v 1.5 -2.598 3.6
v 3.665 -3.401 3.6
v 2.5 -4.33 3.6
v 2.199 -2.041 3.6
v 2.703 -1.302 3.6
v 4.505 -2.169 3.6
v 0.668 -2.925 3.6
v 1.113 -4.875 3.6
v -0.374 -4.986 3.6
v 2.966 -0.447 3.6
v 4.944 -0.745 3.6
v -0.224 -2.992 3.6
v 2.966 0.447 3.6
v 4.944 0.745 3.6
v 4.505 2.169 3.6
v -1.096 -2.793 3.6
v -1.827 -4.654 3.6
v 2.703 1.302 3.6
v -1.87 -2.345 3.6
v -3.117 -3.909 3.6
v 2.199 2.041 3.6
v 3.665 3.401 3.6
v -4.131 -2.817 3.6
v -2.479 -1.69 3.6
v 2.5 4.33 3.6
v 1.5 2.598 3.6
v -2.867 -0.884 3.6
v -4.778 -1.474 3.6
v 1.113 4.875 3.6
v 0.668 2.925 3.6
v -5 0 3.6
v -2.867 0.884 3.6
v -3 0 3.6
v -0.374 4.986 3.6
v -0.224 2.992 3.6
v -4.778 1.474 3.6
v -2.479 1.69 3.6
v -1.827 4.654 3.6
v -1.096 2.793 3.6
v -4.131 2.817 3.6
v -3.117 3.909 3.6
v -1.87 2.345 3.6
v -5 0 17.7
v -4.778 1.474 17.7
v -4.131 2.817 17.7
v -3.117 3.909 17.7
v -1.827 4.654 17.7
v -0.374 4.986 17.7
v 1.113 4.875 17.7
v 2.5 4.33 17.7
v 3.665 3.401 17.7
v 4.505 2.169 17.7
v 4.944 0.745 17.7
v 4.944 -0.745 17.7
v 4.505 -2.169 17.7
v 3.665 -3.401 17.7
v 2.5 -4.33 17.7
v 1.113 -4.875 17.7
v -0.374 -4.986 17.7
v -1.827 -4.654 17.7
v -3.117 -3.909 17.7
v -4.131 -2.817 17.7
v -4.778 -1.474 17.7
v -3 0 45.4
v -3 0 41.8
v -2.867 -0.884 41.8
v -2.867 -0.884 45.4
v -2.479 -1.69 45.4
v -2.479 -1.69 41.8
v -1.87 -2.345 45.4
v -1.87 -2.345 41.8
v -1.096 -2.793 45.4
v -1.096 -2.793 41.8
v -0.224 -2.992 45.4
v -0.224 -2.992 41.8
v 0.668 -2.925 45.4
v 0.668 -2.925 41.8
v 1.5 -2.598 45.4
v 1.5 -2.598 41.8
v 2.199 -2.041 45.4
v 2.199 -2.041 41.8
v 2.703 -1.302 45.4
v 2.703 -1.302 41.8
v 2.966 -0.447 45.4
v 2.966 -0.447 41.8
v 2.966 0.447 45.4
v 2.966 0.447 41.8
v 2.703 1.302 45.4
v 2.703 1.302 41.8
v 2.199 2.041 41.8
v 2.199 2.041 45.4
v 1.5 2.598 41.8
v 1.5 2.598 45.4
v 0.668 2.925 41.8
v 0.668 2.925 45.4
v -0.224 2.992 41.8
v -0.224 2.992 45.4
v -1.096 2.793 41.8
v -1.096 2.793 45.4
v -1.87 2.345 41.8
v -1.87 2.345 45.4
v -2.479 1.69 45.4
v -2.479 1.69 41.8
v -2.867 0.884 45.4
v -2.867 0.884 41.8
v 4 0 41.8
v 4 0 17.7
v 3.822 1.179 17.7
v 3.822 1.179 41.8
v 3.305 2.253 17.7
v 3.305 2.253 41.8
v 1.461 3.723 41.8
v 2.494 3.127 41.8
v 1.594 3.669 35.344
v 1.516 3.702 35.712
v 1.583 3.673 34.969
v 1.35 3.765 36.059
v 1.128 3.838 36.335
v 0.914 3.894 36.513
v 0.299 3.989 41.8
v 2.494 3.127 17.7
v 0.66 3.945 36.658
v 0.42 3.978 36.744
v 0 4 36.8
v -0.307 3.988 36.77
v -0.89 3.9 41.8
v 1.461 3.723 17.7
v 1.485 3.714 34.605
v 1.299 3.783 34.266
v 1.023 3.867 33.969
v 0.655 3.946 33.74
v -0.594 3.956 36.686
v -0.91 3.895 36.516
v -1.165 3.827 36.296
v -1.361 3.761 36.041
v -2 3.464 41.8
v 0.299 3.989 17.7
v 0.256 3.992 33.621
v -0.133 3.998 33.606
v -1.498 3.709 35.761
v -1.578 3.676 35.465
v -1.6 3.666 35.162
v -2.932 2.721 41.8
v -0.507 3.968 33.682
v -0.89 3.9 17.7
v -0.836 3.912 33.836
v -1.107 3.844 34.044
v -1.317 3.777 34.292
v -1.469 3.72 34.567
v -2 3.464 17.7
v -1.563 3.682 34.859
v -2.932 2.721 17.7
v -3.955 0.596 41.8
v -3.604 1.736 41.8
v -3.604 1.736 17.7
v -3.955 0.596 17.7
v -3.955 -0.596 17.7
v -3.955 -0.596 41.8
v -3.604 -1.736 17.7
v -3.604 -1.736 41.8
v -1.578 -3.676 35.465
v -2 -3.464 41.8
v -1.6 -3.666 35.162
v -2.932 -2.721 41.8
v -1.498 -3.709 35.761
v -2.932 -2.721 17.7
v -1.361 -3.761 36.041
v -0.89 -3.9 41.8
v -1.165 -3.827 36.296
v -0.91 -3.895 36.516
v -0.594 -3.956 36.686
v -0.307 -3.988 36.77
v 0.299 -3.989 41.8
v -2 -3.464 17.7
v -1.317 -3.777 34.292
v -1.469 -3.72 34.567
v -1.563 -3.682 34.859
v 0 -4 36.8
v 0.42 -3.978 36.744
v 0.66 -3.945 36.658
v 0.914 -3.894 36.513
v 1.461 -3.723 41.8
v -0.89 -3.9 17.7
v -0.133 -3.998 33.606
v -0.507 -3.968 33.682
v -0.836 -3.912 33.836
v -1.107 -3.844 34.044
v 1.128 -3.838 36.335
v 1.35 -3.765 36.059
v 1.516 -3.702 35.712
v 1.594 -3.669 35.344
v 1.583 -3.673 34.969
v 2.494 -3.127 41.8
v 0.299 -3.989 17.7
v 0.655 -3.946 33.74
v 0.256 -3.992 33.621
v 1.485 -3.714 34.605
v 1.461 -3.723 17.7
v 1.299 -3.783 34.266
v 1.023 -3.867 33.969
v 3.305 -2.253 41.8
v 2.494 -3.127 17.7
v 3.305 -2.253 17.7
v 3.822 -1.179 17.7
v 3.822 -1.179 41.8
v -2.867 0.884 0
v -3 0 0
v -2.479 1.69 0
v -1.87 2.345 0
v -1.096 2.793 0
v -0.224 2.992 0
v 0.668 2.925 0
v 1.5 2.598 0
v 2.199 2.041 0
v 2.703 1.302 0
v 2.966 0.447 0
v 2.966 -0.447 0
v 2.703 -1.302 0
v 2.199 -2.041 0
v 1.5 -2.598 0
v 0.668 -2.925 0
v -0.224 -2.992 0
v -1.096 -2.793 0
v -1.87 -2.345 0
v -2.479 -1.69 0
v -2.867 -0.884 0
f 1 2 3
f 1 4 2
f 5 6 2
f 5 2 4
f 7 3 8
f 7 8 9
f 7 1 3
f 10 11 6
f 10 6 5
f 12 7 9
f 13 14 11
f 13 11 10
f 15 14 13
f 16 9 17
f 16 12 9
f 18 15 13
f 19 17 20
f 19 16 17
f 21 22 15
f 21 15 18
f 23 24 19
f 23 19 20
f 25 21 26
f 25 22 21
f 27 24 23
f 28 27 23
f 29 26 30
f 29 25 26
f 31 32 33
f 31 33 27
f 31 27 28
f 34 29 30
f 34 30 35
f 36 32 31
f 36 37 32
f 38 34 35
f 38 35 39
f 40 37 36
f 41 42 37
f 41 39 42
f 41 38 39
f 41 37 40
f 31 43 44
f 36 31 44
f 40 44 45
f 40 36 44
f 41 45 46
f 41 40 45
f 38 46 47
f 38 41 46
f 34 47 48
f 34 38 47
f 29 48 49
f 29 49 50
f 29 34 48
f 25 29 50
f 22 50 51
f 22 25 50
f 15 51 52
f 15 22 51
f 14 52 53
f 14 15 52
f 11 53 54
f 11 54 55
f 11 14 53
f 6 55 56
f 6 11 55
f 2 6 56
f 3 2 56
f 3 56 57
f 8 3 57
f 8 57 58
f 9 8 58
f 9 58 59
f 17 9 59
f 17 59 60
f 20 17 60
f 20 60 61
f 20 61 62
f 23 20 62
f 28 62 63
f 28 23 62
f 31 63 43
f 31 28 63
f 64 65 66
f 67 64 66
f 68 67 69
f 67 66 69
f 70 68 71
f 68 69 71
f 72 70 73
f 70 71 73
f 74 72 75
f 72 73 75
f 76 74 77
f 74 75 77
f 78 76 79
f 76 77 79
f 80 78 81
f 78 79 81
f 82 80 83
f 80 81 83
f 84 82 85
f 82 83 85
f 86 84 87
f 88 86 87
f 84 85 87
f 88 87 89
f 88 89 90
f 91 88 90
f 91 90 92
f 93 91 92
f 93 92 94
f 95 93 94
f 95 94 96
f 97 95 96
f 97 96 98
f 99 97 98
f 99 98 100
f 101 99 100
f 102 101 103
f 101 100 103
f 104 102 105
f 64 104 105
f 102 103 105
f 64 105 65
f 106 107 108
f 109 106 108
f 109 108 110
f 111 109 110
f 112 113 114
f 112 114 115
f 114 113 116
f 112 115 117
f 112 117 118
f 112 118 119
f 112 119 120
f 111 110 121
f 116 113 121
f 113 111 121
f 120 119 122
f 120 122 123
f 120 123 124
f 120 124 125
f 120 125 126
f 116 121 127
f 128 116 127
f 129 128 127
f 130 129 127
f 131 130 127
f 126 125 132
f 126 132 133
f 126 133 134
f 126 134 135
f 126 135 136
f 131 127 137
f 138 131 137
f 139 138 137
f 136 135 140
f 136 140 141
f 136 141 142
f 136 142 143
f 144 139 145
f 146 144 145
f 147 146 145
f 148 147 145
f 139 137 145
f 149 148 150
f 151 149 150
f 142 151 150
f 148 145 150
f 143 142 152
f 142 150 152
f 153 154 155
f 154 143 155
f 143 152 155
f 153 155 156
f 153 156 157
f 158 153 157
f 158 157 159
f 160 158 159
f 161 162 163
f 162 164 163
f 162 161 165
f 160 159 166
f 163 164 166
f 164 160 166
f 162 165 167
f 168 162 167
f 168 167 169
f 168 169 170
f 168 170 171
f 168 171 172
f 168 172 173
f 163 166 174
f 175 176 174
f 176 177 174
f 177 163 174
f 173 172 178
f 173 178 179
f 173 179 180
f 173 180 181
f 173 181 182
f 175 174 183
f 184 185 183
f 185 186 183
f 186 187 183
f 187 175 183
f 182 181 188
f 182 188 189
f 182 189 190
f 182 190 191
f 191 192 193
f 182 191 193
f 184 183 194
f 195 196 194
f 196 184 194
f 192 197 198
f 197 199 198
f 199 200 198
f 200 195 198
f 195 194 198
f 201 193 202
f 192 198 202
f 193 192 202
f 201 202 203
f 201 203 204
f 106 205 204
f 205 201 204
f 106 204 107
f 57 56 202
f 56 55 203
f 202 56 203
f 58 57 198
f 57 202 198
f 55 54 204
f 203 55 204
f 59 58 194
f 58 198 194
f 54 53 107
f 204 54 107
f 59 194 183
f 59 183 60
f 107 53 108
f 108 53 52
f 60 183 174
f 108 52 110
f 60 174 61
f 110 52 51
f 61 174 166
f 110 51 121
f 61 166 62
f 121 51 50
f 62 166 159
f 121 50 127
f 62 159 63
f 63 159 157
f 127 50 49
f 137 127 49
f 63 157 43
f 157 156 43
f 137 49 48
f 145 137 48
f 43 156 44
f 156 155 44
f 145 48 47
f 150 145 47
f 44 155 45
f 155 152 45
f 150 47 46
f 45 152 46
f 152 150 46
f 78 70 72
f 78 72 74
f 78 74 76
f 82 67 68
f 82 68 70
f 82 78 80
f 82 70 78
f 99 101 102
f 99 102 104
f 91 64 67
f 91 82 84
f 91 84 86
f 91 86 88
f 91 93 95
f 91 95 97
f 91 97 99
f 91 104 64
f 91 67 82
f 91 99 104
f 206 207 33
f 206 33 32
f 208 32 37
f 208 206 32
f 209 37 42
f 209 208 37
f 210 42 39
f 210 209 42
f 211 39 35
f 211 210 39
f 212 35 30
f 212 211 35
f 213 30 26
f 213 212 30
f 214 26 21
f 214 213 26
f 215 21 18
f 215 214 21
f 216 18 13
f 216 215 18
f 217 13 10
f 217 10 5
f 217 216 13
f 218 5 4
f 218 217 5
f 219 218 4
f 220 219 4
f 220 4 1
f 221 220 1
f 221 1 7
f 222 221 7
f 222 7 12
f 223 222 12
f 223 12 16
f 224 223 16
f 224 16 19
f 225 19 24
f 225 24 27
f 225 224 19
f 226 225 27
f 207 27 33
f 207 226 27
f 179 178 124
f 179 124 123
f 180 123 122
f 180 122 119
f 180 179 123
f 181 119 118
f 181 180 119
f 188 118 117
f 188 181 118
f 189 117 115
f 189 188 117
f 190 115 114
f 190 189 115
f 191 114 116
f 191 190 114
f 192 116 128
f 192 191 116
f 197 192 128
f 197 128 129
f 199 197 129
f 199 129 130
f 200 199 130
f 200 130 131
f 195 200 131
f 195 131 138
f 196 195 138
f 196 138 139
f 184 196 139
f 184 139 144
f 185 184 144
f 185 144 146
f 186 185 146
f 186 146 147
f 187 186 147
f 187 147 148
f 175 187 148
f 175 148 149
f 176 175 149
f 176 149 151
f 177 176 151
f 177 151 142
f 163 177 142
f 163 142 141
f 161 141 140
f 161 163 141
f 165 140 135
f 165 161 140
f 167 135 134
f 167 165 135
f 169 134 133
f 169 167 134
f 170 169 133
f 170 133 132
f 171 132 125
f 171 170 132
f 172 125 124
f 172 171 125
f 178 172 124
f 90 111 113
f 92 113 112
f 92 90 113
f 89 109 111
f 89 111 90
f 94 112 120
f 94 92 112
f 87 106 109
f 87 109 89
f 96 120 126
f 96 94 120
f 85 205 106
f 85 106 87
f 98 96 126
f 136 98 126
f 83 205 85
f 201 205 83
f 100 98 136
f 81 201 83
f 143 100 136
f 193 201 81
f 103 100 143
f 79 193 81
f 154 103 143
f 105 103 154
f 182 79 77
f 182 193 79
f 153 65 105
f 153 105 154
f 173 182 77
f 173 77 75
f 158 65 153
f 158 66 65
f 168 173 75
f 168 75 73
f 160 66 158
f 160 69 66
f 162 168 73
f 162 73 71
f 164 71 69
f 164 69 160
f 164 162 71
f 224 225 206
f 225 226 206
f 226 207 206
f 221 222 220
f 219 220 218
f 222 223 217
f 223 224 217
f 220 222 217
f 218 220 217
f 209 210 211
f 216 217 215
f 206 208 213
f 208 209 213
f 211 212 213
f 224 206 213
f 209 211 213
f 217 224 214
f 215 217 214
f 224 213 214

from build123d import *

# Parameters (mm, degrees)
SKETCH_1_R               = 4
EXTRUDE_1_DEPTH          = 45.4
SKETCH_2_R               = 4
SKETCH_2_R_2             = 3
CUT_EXTRUDE_1_DEPTH      = 3.6
CUT_EXTRUDE_START        = -3.6
SKETCH_3_R               = 4
SKETCH_3_R_2             = 3
CUT_EXTRUDE_2_DEPTH      = 3.6
CUT_EXTRUDE_3_DEPTH      = 46.751065561
CUT_EXTRUDE_3_DEPTH_BACK = 46.751065561
SKETCH_4_R               = 1.6
SKETCH_5_R               = 5
SKETCH_5_R_2             = 4
EXTRUDE_2_DEPTH          = 14.1


with BuildPart() as part:
    # ｽｹｯﾁ1 → ﾎﾞｽ - 押し出し1 (new body)
    with BuildSketch(Plane.XY):
        Circle(SKETCH_1_R)
    extrude(amount=EXTRUDE_1_DEPTH)

    # ｽｹｯﾁ2 → ｶｯﾄ - 押し出し1 (cut)
    with BuildSketch(Plane(origin=(0, 0, 0), x_dir=(-1, 0, 0), z_dir=(0, 0, -1))):
        Circle(SKETCH_2_R)
        Circle(SKETCH_2_R_2, mode=Mode.SUBTRACT)
    extrude(amount=-CUT_EXTRUDE_1_DEPTH, mode=Mode.SUBTRACT)

    # ｽｹｯﾁ3 → ｶｯﾄ - 押し出し2 (cut)
    with BuildSketch(Plane.XY.offset(45.4).offset(CUT_EXTRUDE_START)):
        with Locations(Location((0, 0, 0), (0, 0, 180))):
            Circle(SKETCH_3_R)
        with Locations(Location((0, 0, 0), (0, 0, 180))):
            Circle(SKETCH_3_R_2, mode=Mode.SUBTRACT)
    extrude(amount=CUT_EXTRUDE_2_DEPTH, mode=Mode.SUBTRACT)

    # ｽｹｯﾁ4 → ｶｯﾄ - 押し出し3 (cut, two sides: drawn at the far end of the back side and taken through both)
    with BuildSketch(Plane(origin=(0, 0, 0), x_dir=(1, 0, 0), z_dir=(0, 1, 0)).offset(-CUT_EXTRUDE_3_DEPTH_BACK)):
        with Locations(Location((0, -35.2, 0), (0, 0, 270))):
            Circle(SKETCH_4_R)
    extrude(amount=CUT_EXTRUDE_3_DEPTH + CUT_EXTRUDE_3_DEPTH_BACK, mode=Mode.SUBTRACT)

    # ｽｹｯﾁ5 → ﾎﾞｽ - 押し出し2 (add)
    with BuildSketch(Plane(origin=(0, 0, 3.6), x_dir=(-1, 0, 0), z_dir=(0, 0, -1))):
        Circle(SKETCH_5_R)
        Circle(SKETCH_5_R_2, mode=Mode.SUBTRACT)
    extrude(amount=-EXTRUDE_2_DEPTH)


solid = part.part
